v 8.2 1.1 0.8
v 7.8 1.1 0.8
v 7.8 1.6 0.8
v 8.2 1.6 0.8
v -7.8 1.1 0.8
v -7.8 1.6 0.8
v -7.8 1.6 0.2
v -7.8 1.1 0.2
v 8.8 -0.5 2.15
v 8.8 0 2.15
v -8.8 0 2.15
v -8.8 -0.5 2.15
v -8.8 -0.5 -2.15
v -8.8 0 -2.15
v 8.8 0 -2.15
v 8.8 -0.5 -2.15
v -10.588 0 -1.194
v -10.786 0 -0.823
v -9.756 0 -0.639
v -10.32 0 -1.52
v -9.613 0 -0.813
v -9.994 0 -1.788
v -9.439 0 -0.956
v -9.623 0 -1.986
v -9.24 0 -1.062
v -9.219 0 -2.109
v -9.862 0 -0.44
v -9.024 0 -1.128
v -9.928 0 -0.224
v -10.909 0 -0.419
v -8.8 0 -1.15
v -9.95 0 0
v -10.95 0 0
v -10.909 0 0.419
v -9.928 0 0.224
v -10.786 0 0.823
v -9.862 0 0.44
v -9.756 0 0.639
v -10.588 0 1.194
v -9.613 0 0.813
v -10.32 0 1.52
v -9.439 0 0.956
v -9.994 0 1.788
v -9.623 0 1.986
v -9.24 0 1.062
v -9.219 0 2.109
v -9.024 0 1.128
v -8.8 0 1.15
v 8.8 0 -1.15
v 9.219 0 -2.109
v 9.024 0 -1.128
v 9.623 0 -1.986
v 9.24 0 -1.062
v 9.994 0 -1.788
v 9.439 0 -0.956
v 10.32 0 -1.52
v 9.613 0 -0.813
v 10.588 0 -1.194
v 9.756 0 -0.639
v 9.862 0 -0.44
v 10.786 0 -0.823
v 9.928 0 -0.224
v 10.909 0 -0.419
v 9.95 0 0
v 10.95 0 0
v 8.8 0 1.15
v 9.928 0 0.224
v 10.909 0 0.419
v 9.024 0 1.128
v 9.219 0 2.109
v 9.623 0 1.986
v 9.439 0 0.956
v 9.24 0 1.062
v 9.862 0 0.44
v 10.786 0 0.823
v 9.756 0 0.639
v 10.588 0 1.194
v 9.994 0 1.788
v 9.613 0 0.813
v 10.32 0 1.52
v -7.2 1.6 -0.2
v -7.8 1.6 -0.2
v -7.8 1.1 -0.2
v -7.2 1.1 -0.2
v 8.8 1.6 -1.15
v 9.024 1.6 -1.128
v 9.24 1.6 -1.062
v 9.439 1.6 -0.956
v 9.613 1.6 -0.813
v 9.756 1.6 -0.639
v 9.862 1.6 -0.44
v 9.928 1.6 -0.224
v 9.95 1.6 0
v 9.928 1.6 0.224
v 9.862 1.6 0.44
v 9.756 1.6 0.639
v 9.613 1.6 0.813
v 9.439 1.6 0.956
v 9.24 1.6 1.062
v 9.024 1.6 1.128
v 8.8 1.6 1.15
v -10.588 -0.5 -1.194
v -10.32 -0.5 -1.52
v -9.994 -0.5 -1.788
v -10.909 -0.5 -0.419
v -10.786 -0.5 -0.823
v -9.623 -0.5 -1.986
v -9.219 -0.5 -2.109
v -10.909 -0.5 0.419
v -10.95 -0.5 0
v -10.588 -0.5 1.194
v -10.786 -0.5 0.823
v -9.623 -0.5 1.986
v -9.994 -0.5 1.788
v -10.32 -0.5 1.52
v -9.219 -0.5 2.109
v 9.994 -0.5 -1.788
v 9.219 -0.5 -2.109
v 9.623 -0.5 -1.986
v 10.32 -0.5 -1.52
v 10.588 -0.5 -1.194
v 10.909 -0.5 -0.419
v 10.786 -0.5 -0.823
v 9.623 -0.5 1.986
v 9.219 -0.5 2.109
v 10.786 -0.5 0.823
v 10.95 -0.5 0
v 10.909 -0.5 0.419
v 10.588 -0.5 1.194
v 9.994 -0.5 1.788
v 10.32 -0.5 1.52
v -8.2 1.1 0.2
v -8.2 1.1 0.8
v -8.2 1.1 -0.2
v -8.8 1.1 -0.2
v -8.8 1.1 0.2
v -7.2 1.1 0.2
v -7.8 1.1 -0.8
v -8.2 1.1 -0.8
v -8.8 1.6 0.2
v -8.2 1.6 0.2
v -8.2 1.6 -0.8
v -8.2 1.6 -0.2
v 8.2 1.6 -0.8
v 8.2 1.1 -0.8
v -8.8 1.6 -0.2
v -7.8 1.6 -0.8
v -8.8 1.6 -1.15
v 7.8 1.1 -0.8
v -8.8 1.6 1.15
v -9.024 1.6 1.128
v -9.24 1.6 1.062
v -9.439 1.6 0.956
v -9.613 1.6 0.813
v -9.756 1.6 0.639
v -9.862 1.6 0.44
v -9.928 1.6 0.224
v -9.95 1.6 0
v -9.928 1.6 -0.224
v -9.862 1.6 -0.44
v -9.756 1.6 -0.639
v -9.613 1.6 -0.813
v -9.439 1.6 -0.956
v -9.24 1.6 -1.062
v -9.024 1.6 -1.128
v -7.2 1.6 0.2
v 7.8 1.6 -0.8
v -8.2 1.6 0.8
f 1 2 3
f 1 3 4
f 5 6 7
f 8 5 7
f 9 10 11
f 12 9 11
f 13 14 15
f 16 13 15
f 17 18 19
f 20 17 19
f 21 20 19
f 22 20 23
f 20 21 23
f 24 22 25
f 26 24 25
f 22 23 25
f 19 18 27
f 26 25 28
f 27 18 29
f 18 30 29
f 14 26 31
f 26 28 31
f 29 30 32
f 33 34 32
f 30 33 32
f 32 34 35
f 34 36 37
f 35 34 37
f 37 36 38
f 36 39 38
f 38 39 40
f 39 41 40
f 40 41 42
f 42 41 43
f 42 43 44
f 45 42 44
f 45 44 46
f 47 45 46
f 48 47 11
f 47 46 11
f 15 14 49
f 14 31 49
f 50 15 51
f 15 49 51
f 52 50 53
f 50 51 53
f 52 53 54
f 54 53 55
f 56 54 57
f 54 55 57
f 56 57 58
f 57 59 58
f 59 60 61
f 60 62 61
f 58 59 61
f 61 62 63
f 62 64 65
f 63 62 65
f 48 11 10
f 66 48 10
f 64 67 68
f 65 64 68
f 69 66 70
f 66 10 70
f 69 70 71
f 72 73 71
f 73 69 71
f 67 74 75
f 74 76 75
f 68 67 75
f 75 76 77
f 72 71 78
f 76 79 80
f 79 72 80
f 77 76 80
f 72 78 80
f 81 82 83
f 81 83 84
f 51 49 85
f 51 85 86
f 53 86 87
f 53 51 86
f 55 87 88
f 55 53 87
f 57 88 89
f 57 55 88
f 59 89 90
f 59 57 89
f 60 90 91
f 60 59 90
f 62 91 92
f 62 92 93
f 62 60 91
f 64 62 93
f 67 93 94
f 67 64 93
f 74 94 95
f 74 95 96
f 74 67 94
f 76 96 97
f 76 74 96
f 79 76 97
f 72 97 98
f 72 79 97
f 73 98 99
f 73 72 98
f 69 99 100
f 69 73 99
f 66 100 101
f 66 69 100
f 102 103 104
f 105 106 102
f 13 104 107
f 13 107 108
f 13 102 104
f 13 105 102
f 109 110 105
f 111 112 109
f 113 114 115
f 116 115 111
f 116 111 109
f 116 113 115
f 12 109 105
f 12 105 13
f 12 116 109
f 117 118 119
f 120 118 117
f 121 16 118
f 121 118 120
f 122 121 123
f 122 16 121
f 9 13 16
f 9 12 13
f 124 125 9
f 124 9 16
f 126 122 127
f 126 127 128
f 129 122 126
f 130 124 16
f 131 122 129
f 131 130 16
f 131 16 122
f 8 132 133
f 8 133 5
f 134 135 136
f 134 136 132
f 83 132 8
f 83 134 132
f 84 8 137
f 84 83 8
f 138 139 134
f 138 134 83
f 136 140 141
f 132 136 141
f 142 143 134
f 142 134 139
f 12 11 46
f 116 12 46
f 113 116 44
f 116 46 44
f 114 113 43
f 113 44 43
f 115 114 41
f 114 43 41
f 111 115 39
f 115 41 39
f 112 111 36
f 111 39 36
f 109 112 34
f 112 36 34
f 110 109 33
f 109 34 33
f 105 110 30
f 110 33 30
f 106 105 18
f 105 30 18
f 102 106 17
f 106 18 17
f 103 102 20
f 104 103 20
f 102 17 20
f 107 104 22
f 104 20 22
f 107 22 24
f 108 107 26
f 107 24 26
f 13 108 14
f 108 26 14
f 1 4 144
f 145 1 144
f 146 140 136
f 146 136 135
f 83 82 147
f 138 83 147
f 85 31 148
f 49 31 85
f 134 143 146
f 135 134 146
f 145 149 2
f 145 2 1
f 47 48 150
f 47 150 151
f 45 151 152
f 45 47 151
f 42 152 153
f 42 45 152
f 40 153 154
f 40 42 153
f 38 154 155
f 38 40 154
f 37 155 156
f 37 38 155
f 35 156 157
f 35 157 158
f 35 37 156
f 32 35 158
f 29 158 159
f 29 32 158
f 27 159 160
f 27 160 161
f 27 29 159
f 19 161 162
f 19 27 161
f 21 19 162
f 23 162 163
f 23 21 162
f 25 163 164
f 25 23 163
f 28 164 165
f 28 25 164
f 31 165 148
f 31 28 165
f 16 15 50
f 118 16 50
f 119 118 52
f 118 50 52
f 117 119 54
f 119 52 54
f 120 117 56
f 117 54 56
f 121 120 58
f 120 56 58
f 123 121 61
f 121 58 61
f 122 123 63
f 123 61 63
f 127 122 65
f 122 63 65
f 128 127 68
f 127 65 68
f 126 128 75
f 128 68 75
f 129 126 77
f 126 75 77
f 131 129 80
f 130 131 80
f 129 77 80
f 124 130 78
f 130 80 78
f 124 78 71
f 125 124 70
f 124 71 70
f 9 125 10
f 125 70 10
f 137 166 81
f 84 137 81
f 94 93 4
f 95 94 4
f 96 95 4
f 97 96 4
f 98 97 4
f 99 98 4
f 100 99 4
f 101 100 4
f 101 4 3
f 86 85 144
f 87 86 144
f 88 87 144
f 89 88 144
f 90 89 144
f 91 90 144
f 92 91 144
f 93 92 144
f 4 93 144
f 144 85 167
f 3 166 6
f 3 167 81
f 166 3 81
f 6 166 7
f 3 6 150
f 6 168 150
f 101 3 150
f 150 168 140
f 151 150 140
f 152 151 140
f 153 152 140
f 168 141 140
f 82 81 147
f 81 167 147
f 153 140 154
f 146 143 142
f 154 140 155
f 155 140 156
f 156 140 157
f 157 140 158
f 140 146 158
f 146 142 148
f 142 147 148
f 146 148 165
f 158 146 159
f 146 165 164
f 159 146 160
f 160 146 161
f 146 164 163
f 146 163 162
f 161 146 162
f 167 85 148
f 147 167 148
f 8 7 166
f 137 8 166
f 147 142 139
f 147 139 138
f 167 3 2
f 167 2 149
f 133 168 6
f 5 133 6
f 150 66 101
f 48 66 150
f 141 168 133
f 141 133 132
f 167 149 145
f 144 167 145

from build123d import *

# Parameters (mm, degrees)
EXTRUDE_1_DEPTH     = 1.6
EXTRUDE_2_DEPTH     = 0.5
SKETCH_3_W          = 0.4
SKETCH_3_H          = 1.6
SKETCH_3_W_2        = 0.6
SKETCH_3_H_2        = 0.4
SKETCH_3_H_3        = 0.6
CUT_EXTRUDE_1_DEPTH = 0.5


with BuildPart() as part:
    # 草图1 → 凸台-拉伸1 (new body)
    with BuildSketch(Plane(origin=(0, 0, 0), x_dir=(1, 0, 0), z_dir=(0, 1, 0))):
        with BuildLine():
            Line((-8.8, 1.15), (8.8, 1.15))
            ThreePointArc((8.8, 1.15), (9.95, 0), (8.8, -1.15))
            Line((8.8, -1.15), (-8.8, -1.15))
            ThreePointArc((-8.8, -1.15), (-9.95, 0), (-8.8, 1.15))
        make_face()
    extrude(amount=EXTRUDE_1_DEPTH)

    # 草图2 → 凸台-拉伸2 (add)
    with BuildSketch(Plane.XZ):
        with BuildLine():
            Line((-8.8, -2.15), (8.8, -2.15))
            ThreePointArc((8.8, -2.15), (10.95, 0), (8.8, 2.15))
            Line((8.8, 2.15), (-8.8, 2.15))
            ThreePointArc((-8.8, 2.15), (-10.95, 0), (-8.8, -2.15))
        make_face()
    extrude(amount=EXTRUDE_2_DEPTH)

    # 草图3 → 切除-拉伸1 (cut)
    with BuildSketch(Plane(origin=(0, 1.6, 0), x_dir=(1, 0, 0), z_dir=(0, 1, 0))):
        with Locations((8, 0)):
            Rectangle(SKETCH_3_W, SKETCH_3_H)
        with Locations((-8.5, 0)):
            Rectangle(SKETCH_3_W_2, SKETCH_3_H_2)
        with Locations((-8, 0)):
            Rectangle(SKETCH_3_W, SKETCH_3_H_2)
        with Locations((-8, 0.5)):
            Rectangle(SKETCH_3_W, SKETCH_3_H_3)
        with Locations((-7.5, 0)):
            Rectangle(SKETCH_3_W_2, SKETCH_3_H_2)
        with Locations((-8, -0.5)):
            Rectangle(SKETCH_3_W, SKETCH_3_H_3)
    extrude(amount=-CUT_EXTRUDE_1_DEPTH, mode=Mode.SUBTRACT)


solid = part.part
